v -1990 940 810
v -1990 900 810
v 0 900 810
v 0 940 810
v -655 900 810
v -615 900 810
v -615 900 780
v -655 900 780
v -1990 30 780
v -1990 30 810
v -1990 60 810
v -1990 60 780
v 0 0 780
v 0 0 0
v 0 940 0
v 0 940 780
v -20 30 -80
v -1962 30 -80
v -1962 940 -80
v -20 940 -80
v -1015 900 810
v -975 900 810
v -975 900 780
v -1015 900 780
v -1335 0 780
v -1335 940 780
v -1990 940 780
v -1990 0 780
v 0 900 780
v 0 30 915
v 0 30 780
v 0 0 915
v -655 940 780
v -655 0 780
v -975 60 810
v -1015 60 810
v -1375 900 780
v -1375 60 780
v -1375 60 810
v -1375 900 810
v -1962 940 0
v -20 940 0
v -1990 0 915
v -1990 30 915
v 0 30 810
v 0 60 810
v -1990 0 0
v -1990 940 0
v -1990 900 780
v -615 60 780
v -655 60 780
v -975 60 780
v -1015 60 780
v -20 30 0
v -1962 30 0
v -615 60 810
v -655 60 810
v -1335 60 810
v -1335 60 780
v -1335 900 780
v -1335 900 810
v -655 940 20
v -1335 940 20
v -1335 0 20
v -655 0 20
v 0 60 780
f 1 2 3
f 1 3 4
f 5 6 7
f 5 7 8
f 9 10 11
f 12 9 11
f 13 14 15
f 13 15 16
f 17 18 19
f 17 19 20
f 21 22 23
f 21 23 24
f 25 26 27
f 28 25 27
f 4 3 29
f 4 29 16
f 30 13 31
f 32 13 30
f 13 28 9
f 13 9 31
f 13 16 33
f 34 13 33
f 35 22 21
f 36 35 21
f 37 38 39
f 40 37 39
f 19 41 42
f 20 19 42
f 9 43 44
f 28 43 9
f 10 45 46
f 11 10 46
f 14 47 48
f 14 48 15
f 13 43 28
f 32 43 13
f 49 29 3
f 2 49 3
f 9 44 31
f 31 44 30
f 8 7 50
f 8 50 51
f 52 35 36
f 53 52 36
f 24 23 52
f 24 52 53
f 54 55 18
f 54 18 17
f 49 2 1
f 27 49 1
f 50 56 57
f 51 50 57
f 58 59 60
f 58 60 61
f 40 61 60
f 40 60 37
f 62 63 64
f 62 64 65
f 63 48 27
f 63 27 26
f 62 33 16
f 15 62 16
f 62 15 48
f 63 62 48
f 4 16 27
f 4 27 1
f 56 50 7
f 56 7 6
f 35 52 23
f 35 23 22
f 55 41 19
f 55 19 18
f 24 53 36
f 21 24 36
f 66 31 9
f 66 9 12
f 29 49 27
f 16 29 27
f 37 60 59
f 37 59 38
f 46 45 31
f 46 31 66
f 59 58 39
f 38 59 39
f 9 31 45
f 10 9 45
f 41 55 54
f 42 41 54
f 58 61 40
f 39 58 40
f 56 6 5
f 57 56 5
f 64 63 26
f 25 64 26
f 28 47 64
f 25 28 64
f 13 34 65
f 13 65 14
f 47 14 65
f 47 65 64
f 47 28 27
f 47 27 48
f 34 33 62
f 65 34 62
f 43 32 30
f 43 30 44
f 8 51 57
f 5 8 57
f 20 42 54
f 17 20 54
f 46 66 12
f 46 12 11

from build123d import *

# Parameters (mm, degrees)
F0_W     = 680
F0_H     = 20
F1_DEPTH = 940
F2_DEPTH = 30
F3_W     = 30
F3_H     = 30
F3_W_2   = 40
F4_DEPTH = 1990
F5_W     = 40
F5_H     = 30
F6_DEPTH = 840
F7_W     = 1942
F7_H     = 910
F8_DEPTH = 80


with BuildPart() as f1:
    # F0 (on Front) → F1 (new body)
    with BuildSketch(Plane.XZ):
        Polygon((-655, 0), (0, 0), (0, 780), (-655, 780), (-655, 20), align=None)
        Polygon((-1990, 0), (-1335, 0), (-1335, 20), (-1335, 780), (-1990, 780), align=None)
        with Locations((-995, 10)):
            Rectangle(F0_W, F0_H)
    extrude(amount=-F1_DEPTH)


with BuildPart() as f2:
    # F0 (on Front) → F2 (new body)
    with BuildSketch(Plane.XZ):
        Polygon((-655, 780), (0, 780), (0, 915), (-1990, 915), (-1990, 780), (-1335, 780), align=None)
    extrude(amount=-F2_DEPTH)


with BuildPart() as f4:
    # F3 (on face) → F4 (new body, through all)
    with BuildSketch(Plane.YZ):
        with Locations((45, 795)):
            Rectangle(F3_W, F3_H)
        with Locations((920, 795)):
            Rectangle(F3_W_2, F3_H)
    extrude(amount=-F4_DEPTH)


with BuildPart() as f6:
    # F5 (on face) → F6 (new body, through all)
    with BuildSketch(Plane(origin=(0, 60, 0), x_dir=(-1, 0, 0), z_dir=(0, 1, 0))):
        with Locations((635, 795)):
            Rectangle(F5_W, F5_H)
        with Locations((995, 795)):
            Rectangle(F5_W, F5_H)
        with Locations((1355, 795)):
            Rectangle(F5_W, F5_H)
    extrude(amount=F6_DEPTH)


with BuildPart() as f8:
    # F7 (on face) → F8 (new body)
    with BuildSketch(Plane(origin=(0, 0, 0), x_dir=(1, 0, 0), z_dir=(0, 0, -1))):
        with Locations((-991, -485)):
            Rectangle(F7_W, F7_H)
    extrude(amount=F8_DEPTH)


solid = Compound([f1.part, f2.part, f4.part, f6.part, f8.part])
